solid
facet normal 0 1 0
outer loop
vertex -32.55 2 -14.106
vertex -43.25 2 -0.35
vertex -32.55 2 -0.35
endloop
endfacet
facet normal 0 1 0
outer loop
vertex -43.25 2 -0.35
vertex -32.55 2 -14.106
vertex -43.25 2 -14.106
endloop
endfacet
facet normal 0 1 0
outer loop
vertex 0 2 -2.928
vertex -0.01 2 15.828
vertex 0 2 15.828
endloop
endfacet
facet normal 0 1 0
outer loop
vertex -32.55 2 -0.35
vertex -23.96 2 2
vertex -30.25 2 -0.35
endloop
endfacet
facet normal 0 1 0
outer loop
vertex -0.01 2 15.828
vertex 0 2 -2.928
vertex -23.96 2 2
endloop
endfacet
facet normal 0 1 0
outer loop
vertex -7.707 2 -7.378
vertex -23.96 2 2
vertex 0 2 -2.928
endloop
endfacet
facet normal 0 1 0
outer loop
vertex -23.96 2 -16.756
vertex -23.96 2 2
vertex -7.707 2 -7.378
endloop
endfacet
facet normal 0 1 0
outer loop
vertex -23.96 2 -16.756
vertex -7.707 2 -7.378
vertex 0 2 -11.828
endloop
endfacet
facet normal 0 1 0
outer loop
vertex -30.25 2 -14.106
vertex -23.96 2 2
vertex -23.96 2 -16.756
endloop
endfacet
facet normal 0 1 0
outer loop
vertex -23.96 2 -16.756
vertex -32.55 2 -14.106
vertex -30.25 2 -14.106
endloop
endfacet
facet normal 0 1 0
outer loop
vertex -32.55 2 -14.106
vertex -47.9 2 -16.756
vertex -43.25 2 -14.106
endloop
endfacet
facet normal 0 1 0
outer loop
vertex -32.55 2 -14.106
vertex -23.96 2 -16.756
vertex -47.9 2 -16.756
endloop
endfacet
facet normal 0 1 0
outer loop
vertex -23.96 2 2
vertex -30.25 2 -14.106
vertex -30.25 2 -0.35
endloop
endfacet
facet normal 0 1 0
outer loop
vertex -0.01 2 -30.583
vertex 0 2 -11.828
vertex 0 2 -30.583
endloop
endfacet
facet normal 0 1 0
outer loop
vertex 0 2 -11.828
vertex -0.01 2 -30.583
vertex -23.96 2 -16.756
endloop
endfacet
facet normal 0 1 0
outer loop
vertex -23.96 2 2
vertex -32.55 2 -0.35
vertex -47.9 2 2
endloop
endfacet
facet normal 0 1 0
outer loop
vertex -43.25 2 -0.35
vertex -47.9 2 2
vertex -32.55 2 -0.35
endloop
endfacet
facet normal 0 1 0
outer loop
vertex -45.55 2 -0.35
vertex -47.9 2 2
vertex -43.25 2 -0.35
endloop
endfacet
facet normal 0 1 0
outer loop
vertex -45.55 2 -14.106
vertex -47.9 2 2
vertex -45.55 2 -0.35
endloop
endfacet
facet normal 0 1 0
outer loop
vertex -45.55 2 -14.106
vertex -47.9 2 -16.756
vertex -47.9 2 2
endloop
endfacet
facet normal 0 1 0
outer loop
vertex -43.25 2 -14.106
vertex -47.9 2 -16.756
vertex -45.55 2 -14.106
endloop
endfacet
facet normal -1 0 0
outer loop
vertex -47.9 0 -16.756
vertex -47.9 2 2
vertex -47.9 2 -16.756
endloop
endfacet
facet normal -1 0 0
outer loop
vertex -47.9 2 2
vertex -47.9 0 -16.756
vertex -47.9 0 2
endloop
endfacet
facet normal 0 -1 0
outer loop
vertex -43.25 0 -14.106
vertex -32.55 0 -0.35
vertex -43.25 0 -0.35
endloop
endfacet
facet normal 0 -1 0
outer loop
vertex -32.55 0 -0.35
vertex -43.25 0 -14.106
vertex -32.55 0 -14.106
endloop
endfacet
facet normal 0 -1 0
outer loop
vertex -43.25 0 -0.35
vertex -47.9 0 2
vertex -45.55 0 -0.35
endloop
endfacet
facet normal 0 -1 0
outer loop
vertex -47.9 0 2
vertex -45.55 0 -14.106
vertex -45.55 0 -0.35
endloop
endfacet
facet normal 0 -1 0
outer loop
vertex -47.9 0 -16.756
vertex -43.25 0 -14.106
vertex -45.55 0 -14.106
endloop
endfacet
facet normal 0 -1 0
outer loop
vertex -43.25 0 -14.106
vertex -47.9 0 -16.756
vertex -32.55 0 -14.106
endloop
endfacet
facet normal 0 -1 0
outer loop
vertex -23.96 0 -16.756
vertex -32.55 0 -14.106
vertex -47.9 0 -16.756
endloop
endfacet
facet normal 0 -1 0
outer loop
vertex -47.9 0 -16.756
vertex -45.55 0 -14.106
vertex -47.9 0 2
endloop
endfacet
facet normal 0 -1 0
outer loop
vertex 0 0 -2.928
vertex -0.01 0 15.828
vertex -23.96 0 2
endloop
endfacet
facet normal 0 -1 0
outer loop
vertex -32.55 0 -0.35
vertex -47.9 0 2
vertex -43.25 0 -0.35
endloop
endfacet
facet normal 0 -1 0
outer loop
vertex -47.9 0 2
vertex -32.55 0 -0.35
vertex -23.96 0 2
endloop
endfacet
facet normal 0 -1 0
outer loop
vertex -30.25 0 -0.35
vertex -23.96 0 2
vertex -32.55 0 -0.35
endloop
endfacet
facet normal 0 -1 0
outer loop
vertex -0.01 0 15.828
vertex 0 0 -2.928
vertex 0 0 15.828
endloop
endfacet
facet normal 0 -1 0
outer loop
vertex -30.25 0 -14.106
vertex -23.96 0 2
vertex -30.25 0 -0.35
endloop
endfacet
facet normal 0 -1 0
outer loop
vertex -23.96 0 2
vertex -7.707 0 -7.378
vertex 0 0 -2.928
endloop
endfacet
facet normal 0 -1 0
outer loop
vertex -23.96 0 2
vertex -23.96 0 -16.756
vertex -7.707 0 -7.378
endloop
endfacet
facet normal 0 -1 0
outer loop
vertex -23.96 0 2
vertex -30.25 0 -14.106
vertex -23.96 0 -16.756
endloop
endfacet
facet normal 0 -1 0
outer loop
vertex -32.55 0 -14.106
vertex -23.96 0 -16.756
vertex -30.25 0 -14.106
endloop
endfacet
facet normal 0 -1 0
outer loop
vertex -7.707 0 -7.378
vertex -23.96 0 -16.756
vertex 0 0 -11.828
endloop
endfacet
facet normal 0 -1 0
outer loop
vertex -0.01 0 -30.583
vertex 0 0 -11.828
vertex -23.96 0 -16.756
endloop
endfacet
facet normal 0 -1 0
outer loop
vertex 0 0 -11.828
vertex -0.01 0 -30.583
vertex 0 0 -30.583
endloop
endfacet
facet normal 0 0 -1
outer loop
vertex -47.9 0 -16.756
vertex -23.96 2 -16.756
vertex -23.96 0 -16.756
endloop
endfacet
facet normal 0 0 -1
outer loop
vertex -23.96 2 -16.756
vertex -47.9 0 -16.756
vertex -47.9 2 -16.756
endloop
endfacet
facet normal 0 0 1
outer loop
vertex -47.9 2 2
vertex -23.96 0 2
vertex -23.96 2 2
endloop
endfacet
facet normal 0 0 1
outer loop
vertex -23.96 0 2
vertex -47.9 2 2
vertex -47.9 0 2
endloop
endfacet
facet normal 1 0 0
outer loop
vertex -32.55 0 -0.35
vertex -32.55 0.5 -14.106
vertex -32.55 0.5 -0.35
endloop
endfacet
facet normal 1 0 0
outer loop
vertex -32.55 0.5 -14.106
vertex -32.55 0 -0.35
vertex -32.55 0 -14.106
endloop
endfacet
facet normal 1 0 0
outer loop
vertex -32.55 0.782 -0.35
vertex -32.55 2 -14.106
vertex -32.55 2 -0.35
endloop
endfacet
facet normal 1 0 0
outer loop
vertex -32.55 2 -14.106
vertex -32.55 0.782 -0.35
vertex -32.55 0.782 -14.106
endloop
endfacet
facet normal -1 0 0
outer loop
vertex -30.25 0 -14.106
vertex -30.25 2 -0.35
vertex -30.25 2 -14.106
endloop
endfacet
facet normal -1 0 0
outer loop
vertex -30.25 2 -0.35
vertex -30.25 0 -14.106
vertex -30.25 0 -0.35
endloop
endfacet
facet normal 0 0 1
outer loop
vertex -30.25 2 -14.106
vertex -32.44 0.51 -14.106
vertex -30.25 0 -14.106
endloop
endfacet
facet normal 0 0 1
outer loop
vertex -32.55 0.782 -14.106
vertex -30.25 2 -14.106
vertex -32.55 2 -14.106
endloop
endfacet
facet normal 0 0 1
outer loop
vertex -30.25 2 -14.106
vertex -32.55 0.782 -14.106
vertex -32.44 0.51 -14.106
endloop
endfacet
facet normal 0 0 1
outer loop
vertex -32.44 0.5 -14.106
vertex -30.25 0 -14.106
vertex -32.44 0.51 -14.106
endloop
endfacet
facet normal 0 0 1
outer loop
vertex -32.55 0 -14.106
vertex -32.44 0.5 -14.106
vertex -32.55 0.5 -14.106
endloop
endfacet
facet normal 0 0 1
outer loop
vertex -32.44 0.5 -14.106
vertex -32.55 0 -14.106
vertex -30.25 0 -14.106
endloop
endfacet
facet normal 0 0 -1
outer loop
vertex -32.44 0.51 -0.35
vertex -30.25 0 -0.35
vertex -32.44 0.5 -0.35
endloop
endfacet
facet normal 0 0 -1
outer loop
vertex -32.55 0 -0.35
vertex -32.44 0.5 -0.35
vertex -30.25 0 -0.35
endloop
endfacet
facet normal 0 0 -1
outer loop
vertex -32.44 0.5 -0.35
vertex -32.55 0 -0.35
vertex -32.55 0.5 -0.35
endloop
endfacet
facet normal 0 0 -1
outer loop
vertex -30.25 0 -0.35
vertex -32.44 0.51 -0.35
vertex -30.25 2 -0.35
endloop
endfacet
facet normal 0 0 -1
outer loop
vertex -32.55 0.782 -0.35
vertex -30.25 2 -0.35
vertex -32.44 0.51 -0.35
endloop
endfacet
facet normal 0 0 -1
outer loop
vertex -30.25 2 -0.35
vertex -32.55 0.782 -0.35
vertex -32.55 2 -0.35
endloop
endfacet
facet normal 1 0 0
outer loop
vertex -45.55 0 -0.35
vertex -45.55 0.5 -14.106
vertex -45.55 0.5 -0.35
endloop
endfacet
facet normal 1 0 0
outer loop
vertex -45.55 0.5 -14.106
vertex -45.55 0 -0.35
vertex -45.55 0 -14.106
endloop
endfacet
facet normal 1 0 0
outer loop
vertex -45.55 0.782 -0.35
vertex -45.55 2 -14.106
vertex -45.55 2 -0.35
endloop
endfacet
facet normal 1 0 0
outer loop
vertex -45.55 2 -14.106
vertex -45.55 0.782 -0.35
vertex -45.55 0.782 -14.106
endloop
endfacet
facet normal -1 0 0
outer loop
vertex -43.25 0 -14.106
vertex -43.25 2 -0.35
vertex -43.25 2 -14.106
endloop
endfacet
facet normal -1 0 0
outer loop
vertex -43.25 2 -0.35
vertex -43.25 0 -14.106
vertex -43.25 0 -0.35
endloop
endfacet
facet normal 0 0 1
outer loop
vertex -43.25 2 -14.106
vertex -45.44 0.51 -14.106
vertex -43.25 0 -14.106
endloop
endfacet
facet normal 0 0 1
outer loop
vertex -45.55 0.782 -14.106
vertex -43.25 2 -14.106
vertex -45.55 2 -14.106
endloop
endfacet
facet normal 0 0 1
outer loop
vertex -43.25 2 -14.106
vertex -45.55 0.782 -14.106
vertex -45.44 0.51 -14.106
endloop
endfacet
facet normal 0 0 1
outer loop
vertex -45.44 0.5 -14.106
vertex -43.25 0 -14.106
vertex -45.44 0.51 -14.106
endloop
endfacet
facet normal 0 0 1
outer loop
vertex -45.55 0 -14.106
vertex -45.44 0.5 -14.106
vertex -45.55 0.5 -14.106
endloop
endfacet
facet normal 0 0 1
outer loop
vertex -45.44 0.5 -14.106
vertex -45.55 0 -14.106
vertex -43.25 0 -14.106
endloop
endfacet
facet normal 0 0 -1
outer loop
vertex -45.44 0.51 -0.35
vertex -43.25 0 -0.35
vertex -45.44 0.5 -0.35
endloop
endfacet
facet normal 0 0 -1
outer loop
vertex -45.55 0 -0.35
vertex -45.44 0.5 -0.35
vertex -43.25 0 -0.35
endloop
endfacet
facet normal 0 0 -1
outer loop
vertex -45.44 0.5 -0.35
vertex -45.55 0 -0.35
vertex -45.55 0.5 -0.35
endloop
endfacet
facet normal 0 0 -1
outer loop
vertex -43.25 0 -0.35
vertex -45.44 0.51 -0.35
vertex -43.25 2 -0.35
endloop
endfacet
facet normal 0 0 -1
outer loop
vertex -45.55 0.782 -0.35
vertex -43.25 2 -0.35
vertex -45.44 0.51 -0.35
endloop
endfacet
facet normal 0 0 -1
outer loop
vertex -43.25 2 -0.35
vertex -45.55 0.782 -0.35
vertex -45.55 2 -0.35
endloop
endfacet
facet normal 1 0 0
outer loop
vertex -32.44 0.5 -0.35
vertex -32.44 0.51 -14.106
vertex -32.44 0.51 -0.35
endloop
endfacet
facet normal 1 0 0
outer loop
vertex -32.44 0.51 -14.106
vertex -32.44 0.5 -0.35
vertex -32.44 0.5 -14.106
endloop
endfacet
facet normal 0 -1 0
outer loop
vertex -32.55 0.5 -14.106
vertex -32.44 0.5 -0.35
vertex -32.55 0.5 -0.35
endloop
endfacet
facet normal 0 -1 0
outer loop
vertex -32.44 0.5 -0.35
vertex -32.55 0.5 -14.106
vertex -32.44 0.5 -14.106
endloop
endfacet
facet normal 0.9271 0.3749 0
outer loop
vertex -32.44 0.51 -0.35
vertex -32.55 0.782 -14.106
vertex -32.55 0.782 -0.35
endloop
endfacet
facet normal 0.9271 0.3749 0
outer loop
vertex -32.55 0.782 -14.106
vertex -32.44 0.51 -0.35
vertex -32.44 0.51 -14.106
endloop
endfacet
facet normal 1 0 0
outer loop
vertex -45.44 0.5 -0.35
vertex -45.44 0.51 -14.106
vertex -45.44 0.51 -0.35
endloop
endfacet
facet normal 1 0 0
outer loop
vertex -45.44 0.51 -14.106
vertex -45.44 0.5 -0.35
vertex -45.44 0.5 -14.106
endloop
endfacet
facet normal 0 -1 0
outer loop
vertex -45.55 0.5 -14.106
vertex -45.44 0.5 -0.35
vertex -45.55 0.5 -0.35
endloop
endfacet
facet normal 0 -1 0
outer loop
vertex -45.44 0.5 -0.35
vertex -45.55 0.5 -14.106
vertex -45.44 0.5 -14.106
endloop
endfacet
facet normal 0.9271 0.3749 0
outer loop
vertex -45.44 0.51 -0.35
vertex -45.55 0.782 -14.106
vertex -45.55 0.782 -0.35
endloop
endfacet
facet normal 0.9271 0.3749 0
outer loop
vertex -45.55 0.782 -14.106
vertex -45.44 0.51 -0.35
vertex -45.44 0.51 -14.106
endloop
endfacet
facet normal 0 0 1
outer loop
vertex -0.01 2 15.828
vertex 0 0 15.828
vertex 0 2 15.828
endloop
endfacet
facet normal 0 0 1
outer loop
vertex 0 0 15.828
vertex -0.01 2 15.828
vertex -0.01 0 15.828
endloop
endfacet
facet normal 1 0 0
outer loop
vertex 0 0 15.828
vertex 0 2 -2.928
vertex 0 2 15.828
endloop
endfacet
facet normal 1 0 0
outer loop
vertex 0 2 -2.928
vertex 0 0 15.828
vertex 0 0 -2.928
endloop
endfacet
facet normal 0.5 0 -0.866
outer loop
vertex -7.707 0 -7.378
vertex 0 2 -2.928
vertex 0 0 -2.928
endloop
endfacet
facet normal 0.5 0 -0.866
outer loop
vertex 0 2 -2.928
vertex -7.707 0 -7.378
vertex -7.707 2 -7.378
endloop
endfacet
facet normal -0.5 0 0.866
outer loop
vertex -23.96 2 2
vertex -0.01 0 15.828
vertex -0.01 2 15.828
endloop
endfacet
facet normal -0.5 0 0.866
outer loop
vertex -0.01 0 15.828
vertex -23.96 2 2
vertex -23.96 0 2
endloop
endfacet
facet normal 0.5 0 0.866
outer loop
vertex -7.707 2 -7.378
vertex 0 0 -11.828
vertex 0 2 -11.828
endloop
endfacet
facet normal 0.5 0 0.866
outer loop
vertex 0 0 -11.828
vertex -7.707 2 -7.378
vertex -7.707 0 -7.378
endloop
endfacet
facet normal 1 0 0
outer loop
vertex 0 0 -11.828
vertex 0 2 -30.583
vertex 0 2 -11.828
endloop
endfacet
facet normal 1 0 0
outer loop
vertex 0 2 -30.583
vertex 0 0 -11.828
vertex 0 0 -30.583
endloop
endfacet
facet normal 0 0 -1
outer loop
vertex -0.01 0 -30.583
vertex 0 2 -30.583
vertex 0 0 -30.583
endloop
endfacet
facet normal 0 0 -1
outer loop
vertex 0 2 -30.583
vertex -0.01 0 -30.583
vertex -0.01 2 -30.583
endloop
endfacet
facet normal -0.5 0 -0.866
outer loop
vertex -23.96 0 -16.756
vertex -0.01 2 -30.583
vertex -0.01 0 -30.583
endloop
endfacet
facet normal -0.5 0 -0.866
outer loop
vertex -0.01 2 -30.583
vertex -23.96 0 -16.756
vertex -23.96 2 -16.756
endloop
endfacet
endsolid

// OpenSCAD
// file: bolt-drying-rack-config.scad
// --- TEKTONOLOGY FASTENED KNEELER BOOT — BOLT DRYING RACK CONFIG ---
// Shared parameters for drying rack plates and legs.
include <kneeler-boot-config.scad>

// --- Plate Parameters ---
cols          = 25;     // bolts per plate
rows          = 2;      // rows of bolts
spacing       = head_dia + bolt_clearance;  // center-to-center hole spacing (along X)
row_spacing   = spacing * sin(60);          // tighter Y spacing for hex packing
plate_thick   = 2;      // plate thickness (mm)
edge_margin   = 4;      // margin from outermost hole to plate edge

// Hole diameter: shaft passes through, head rests on top plate
// Head margin: (head_dia - hole_dia) / 2 = 1.2mm per side resting on plate
hole_dia      = bolt_dia + bolt_clearance * 2;

// --- Derived plate dimensions ---
stagger       = spacing / 2;                                    // row-1 X offset for staggered pattern
pattern_x     = (cols - 1) * spacing + stagger;                 // combined hole pattern width
tab_length    = spacing;                                        // solid margin on each end for leg channels
plate_x       = pattern_x + (edge_margin * 2) + (tab_length * 2);  // plate length
plate_y       = (rows - 1) * row_spacing + (edge_margin * 2);  // plate width
hole_x0       = tab_length + edge_margin;                       // first hole X (row 0)

// End-stop flange at -X end of plate: taller than channel slot, blocks slide-through
stop_width    = 1;      // flange width along X
stop_extra    = 1;      // how much taller than plate_thick (must exceed slot clearance)

// --- Two-plate hanging geometry ---
compound_length = bolt_length / 4;                             // 1/4 shaft sticks below bottom plate
shaft_below_top = bolt_length - plate_thick;                  // shaft below top plate
plate_gap       = shaft_below_top - plate_thick - compound_length; // vertical gap between plates

// Heights (Z positions of plate bottom surfaces)
clearance_mm    = 25.4;                                       // bolt tip ~1 inch above ground
bottom_plate_z  = clearance_mm + compound_length;             // bottom plate Z
top_plate_z     = bottom_plate_z + plate_thick + plate_gap;   // top plate Z

// --- Leg / Channel Parameters ---
slot_tol      = 0.15;   // clearance per side in slot
channel_wall  = 2.5;    // wall thickness on Y sides of each channel
leg_post_x    = 2;      // leg thickness along X (plate slide direction)
detent_h      = 0.4;    // snap detent height — ceiling only (must be >= 1 layer height)
detent_w      = 1.0;    // detent width along X (slide direction)

// Derived leg dimensions
slot_h        = plate_thick + slot_tol * 2;   // slot height (Z)
slot_y        = plate_y + slot_tol * 2;       // slot width (Y) — plate fits inside
leg_post_y    = slot_y + channel_wall * 2;    // total leg Y width
total_height  = top_plate_z + plate_thick + channel_wall; // leg total height

// --- Y-branch (inverted Y) ---
split_z       = total_height / 2;                  // Z where post splits into two branches
splay_angle   = 30;                                // degrees from vertical
splay         = split_z * tan(splay_angle);        // Y offset of each foot from center
foot_w        = leg_post_x;                        // foot pad width (X)
foot_d        = leg_post_y;                        // foot pad depth (Y) — same as post
// main file
// --- TEKTONOLOGY FASTENED KNEELER BOOT — BOLT DRYING RACK LEG ---
// Inverted Y leg: upper post with plate channels, splits into two
// angled branches halfway down for stability.
// Print 2 per rack. Printed on its side — use brim in slicer for
// bed adhesion on the thin angled branches.
include <bolt-drying-rack-config.scad>

module channel_slot(z_base) {
    translate([-0.1, channel_wall - slot_tol, z_base - slot_tol])
        cube([leg_post_x + 0.2, slot_y, slot_h]);
}

// Ceiling-only detent: plate rests on slot floor with full clearance,
// ceiling detent presses down to retain. Running clearance = slot_tol * 2.
module snap_detent(z_base) {
    translate([leg_post_x / 2 - detent_w / 2, channel_wall - slot_tol, z_base + slot_h - 0.01 + slot_tol])
        hull() {
            cube([detent_w, slot_y, 0.01]);
            translate([0, 0, -detent_h])
                cube([0.01, slot_y, 0.01]);
        }
}

module post_section_at(z) {
    translate([0, 0, z])
        cube([leg_post_x, leg_post_y, 0.01]);
}

module foot_pad(y_offset) {
    translate([0, leg_post_y / 2 - foot_d / 2 + y_offset, 0])
        cube([foot_w, foot_d, 0.01]);
}

module leg() {
    union() {
        // Upper post with channels
        difference() {
            translate([0, 0, split_z])
                cube([leg_post_x, leg_post_y, total_height - split_z]);
            channel_slot(bottom_plate_z);
            channel_slot(top_plate_z);
        }
        snap_detent(bottom_plate_z);
        snap_detent(top_plate_z);

        // Lower Y-branches
        hull() {
            post_section_at(split_z);
            foot_pad(-splay);
        }
        hull() {
            post_section_at(split_z);
            foot_pad(splay);
        }
    }
}

// Lay on side for printing
translate([0, 0, leg_post_x])
    rotate([-90, 0, 90])
        leg();
